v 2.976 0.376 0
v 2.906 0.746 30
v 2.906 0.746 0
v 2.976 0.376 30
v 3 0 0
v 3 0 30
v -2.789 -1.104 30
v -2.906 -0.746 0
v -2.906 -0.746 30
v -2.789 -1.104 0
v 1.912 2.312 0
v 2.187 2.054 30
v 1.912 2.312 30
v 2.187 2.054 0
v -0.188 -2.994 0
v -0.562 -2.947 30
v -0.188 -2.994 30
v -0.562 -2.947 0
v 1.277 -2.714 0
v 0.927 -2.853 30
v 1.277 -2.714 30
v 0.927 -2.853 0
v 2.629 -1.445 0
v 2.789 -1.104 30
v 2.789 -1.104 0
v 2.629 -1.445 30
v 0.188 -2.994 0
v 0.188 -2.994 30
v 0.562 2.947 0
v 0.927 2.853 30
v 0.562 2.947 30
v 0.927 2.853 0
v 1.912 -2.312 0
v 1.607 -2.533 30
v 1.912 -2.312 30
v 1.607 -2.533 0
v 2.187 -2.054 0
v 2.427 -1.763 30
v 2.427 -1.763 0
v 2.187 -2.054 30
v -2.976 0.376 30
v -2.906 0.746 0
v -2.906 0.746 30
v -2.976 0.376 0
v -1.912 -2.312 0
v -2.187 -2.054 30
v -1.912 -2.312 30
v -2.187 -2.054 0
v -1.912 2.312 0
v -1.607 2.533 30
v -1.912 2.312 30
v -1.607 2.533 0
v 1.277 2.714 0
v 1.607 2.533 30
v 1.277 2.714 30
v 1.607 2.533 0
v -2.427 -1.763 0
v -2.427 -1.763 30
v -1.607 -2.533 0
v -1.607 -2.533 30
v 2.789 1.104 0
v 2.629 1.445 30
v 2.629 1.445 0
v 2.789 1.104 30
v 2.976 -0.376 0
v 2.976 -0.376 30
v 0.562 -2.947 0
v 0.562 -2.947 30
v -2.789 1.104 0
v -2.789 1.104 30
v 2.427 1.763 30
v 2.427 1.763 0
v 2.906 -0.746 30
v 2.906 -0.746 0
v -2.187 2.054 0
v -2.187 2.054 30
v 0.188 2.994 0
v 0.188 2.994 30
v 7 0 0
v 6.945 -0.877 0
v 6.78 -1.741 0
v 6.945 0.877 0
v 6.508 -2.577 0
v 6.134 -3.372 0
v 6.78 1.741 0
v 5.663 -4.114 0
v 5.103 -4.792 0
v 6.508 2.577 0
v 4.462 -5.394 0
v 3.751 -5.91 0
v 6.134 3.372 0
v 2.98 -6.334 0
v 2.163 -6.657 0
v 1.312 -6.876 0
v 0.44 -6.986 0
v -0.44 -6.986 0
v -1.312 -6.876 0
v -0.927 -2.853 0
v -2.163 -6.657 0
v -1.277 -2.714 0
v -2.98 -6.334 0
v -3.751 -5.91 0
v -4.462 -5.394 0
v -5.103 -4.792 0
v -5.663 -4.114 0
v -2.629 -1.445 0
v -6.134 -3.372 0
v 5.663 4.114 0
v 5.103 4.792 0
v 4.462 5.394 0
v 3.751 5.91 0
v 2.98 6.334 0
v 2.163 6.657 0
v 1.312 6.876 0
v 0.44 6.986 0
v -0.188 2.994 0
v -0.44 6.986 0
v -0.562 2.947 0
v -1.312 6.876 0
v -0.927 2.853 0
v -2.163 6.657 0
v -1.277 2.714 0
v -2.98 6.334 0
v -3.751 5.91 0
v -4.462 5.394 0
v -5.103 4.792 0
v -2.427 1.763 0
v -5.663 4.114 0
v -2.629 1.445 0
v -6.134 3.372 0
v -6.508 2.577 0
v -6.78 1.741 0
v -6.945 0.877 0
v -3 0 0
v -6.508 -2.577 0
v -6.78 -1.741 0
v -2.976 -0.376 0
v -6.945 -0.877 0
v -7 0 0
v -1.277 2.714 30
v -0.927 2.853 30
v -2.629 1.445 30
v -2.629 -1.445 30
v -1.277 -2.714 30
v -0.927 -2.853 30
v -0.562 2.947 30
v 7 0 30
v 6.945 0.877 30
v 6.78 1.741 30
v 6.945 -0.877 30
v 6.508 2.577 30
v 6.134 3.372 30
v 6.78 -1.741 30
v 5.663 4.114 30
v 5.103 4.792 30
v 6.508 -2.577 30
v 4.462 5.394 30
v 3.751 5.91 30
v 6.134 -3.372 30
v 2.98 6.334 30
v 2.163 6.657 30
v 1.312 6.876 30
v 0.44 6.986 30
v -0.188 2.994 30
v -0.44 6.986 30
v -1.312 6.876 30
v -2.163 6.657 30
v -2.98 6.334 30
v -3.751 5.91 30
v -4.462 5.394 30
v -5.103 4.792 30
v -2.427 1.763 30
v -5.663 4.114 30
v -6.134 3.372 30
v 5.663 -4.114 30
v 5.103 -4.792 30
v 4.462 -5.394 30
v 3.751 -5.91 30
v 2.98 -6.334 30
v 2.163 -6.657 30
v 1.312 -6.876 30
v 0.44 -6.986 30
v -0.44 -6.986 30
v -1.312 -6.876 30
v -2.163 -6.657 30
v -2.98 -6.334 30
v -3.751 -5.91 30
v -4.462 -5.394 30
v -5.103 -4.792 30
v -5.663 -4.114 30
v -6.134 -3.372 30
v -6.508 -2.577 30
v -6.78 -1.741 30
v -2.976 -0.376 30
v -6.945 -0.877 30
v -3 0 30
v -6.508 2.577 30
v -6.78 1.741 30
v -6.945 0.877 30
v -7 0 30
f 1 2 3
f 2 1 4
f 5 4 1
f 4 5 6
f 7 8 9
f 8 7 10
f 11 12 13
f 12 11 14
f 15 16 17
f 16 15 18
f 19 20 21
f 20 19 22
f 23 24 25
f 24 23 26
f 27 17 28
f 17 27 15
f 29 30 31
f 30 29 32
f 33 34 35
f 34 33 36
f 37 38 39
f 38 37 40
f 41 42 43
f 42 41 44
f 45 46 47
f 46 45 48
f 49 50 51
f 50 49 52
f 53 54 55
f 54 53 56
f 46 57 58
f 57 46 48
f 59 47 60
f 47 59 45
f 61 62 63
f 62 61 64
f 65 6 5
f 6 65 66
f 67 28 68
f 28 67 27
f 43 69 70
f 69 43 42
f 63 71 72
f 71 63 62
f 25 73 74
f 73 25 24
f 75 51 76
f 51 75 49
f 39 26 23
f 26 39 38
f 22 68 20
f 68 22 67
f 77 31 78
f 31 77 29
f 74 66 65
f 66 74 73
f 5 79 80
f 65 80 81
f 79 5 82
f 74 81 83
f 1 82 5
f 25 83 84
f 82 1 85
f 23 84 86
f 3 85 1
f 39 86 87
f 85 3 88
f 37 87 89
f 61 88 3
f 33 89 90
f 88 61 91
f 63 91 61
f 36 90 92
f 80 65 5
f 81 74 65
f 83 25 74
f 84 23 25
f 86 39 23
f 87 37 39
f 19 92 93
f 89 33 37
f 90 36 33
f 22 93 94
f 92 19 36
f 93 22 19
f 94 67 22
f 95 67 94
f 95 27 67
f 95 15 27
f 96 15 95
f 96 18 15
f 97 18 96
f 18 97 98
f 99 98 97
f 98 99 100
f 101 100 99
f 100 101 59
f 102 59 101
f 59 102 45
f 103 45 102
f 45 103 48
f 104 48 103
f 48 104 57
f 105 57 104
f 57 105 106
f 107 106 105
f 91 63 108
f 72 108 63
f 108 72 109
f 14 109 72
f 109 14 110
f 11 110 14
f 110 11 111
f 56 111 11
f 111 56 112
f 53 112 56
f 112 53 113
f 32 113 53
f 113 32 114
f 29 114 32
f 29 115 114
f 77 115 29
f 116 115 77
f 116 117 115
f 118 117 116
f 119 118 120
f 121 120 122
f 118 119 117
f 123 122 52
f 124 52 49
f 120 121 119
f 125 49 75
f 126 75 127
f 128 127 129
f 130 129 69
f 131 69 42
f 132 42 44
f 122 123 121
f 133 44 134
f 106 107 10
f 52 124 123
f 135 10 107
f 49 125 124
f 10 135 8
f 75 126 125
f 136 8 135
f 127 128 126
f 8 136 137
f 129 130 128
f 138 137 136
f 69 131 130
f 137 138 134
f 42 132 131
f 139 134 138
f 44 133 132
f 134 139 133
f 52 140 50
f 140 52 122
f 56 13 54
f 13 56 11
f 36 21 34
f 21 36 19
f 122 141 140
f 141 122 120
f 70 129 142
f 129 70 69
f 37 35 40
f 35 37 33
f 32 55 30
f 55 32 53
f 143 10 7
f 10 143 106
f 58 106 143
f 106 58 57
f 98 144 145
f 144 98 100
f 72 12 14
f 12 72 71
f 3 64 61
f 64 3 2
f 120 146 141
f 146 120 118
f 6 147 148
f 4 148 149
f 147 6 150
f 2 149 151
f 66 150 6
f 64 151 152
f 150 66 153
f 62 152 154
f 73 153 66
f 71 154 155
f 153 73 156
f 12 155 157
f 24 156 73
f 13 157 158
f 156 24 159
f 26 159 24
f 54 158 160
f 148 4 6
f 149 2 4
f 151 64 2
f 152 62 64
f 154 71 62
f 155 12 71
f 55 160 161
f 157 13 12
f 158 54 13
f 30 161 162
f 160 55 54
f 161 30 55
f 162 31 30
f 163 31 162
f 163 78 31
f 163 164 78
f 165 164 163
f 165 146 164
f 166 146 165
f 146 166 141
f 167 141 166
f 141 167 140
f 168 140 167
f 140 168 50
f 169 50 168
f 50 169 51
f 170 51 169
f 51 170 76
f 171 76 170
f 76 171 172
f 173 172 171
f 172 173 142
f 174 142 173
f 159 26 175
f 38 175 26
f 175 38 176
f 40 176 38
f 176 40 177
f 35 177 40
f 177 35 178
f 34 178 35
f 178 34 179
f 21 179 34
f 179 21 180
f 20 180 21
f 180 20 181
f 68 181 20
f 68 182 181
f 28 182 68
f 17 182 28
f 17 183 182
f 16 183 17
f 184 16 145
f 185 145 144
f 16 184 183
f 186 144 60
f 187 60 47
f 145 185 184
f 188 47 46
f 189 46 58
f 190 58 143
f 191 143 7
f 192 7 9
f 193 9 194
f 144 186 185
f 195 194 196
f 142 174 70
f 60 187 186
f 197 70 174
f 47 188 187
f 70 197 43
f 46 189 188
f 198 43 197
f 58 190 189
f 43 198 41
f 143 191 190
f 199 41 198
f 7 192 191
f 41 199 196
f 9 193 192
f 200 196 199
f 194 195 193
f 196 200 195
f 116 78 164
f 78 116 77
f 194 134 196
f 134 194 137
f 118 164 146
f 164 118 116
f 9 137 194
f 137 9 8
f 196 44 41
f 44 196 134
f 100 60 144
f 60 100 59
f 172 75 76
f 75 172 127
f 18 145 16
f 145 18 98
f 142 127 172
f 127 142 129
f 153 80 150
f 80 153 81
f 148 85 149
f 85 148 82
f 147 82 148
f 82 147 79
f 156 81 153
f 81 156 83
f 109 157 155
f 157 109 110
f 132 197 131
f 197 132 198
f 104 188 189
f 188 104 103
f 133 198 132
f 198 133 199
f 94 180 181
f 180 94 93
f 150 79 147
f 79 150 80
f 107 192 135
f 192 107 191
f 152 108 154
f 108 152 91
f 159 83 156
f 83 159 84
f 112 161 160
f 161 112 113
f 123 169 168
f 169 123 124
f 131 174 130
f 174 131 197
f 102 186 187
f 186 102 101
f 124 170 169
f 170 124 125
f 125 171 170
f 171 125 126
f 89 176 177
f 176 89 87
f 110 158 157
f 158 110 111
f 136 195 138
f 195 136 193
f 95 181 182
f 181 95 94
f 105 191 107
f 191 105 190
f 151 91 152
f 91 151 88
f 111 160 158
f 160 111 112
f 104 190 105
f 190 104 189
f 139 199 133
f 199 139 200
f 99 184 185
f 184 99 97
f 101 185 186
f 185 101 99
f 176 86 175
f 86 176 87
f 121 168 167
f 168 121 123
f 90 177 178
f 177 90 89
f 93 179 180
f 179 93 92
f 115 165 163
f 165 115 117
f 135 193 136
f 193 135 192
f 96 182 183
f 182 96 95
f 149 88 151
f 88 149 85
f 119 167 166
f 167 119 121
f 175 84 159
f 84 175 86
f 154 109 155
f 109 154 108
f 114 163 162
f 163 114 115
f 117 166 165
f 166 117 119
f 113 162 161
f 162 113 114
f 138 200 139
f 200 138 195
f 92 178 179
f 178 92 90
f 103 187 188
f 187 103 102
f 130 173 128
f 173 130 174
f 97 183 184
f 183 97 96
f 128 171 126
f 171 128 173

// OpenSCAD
$fn = 50;


difference() {
	union() {
		cylinder(h = 30, r = 7.0000000000);
	}
	union() {
		cylinder(h = 30, r = 3.0000000000);
		cylinder(h = 30, r = 1.5000000000);
		cylinder(h = 30, r = 1.5000000000);
		cylinder(h = 30, r = 1.5000000000);
	}
}
